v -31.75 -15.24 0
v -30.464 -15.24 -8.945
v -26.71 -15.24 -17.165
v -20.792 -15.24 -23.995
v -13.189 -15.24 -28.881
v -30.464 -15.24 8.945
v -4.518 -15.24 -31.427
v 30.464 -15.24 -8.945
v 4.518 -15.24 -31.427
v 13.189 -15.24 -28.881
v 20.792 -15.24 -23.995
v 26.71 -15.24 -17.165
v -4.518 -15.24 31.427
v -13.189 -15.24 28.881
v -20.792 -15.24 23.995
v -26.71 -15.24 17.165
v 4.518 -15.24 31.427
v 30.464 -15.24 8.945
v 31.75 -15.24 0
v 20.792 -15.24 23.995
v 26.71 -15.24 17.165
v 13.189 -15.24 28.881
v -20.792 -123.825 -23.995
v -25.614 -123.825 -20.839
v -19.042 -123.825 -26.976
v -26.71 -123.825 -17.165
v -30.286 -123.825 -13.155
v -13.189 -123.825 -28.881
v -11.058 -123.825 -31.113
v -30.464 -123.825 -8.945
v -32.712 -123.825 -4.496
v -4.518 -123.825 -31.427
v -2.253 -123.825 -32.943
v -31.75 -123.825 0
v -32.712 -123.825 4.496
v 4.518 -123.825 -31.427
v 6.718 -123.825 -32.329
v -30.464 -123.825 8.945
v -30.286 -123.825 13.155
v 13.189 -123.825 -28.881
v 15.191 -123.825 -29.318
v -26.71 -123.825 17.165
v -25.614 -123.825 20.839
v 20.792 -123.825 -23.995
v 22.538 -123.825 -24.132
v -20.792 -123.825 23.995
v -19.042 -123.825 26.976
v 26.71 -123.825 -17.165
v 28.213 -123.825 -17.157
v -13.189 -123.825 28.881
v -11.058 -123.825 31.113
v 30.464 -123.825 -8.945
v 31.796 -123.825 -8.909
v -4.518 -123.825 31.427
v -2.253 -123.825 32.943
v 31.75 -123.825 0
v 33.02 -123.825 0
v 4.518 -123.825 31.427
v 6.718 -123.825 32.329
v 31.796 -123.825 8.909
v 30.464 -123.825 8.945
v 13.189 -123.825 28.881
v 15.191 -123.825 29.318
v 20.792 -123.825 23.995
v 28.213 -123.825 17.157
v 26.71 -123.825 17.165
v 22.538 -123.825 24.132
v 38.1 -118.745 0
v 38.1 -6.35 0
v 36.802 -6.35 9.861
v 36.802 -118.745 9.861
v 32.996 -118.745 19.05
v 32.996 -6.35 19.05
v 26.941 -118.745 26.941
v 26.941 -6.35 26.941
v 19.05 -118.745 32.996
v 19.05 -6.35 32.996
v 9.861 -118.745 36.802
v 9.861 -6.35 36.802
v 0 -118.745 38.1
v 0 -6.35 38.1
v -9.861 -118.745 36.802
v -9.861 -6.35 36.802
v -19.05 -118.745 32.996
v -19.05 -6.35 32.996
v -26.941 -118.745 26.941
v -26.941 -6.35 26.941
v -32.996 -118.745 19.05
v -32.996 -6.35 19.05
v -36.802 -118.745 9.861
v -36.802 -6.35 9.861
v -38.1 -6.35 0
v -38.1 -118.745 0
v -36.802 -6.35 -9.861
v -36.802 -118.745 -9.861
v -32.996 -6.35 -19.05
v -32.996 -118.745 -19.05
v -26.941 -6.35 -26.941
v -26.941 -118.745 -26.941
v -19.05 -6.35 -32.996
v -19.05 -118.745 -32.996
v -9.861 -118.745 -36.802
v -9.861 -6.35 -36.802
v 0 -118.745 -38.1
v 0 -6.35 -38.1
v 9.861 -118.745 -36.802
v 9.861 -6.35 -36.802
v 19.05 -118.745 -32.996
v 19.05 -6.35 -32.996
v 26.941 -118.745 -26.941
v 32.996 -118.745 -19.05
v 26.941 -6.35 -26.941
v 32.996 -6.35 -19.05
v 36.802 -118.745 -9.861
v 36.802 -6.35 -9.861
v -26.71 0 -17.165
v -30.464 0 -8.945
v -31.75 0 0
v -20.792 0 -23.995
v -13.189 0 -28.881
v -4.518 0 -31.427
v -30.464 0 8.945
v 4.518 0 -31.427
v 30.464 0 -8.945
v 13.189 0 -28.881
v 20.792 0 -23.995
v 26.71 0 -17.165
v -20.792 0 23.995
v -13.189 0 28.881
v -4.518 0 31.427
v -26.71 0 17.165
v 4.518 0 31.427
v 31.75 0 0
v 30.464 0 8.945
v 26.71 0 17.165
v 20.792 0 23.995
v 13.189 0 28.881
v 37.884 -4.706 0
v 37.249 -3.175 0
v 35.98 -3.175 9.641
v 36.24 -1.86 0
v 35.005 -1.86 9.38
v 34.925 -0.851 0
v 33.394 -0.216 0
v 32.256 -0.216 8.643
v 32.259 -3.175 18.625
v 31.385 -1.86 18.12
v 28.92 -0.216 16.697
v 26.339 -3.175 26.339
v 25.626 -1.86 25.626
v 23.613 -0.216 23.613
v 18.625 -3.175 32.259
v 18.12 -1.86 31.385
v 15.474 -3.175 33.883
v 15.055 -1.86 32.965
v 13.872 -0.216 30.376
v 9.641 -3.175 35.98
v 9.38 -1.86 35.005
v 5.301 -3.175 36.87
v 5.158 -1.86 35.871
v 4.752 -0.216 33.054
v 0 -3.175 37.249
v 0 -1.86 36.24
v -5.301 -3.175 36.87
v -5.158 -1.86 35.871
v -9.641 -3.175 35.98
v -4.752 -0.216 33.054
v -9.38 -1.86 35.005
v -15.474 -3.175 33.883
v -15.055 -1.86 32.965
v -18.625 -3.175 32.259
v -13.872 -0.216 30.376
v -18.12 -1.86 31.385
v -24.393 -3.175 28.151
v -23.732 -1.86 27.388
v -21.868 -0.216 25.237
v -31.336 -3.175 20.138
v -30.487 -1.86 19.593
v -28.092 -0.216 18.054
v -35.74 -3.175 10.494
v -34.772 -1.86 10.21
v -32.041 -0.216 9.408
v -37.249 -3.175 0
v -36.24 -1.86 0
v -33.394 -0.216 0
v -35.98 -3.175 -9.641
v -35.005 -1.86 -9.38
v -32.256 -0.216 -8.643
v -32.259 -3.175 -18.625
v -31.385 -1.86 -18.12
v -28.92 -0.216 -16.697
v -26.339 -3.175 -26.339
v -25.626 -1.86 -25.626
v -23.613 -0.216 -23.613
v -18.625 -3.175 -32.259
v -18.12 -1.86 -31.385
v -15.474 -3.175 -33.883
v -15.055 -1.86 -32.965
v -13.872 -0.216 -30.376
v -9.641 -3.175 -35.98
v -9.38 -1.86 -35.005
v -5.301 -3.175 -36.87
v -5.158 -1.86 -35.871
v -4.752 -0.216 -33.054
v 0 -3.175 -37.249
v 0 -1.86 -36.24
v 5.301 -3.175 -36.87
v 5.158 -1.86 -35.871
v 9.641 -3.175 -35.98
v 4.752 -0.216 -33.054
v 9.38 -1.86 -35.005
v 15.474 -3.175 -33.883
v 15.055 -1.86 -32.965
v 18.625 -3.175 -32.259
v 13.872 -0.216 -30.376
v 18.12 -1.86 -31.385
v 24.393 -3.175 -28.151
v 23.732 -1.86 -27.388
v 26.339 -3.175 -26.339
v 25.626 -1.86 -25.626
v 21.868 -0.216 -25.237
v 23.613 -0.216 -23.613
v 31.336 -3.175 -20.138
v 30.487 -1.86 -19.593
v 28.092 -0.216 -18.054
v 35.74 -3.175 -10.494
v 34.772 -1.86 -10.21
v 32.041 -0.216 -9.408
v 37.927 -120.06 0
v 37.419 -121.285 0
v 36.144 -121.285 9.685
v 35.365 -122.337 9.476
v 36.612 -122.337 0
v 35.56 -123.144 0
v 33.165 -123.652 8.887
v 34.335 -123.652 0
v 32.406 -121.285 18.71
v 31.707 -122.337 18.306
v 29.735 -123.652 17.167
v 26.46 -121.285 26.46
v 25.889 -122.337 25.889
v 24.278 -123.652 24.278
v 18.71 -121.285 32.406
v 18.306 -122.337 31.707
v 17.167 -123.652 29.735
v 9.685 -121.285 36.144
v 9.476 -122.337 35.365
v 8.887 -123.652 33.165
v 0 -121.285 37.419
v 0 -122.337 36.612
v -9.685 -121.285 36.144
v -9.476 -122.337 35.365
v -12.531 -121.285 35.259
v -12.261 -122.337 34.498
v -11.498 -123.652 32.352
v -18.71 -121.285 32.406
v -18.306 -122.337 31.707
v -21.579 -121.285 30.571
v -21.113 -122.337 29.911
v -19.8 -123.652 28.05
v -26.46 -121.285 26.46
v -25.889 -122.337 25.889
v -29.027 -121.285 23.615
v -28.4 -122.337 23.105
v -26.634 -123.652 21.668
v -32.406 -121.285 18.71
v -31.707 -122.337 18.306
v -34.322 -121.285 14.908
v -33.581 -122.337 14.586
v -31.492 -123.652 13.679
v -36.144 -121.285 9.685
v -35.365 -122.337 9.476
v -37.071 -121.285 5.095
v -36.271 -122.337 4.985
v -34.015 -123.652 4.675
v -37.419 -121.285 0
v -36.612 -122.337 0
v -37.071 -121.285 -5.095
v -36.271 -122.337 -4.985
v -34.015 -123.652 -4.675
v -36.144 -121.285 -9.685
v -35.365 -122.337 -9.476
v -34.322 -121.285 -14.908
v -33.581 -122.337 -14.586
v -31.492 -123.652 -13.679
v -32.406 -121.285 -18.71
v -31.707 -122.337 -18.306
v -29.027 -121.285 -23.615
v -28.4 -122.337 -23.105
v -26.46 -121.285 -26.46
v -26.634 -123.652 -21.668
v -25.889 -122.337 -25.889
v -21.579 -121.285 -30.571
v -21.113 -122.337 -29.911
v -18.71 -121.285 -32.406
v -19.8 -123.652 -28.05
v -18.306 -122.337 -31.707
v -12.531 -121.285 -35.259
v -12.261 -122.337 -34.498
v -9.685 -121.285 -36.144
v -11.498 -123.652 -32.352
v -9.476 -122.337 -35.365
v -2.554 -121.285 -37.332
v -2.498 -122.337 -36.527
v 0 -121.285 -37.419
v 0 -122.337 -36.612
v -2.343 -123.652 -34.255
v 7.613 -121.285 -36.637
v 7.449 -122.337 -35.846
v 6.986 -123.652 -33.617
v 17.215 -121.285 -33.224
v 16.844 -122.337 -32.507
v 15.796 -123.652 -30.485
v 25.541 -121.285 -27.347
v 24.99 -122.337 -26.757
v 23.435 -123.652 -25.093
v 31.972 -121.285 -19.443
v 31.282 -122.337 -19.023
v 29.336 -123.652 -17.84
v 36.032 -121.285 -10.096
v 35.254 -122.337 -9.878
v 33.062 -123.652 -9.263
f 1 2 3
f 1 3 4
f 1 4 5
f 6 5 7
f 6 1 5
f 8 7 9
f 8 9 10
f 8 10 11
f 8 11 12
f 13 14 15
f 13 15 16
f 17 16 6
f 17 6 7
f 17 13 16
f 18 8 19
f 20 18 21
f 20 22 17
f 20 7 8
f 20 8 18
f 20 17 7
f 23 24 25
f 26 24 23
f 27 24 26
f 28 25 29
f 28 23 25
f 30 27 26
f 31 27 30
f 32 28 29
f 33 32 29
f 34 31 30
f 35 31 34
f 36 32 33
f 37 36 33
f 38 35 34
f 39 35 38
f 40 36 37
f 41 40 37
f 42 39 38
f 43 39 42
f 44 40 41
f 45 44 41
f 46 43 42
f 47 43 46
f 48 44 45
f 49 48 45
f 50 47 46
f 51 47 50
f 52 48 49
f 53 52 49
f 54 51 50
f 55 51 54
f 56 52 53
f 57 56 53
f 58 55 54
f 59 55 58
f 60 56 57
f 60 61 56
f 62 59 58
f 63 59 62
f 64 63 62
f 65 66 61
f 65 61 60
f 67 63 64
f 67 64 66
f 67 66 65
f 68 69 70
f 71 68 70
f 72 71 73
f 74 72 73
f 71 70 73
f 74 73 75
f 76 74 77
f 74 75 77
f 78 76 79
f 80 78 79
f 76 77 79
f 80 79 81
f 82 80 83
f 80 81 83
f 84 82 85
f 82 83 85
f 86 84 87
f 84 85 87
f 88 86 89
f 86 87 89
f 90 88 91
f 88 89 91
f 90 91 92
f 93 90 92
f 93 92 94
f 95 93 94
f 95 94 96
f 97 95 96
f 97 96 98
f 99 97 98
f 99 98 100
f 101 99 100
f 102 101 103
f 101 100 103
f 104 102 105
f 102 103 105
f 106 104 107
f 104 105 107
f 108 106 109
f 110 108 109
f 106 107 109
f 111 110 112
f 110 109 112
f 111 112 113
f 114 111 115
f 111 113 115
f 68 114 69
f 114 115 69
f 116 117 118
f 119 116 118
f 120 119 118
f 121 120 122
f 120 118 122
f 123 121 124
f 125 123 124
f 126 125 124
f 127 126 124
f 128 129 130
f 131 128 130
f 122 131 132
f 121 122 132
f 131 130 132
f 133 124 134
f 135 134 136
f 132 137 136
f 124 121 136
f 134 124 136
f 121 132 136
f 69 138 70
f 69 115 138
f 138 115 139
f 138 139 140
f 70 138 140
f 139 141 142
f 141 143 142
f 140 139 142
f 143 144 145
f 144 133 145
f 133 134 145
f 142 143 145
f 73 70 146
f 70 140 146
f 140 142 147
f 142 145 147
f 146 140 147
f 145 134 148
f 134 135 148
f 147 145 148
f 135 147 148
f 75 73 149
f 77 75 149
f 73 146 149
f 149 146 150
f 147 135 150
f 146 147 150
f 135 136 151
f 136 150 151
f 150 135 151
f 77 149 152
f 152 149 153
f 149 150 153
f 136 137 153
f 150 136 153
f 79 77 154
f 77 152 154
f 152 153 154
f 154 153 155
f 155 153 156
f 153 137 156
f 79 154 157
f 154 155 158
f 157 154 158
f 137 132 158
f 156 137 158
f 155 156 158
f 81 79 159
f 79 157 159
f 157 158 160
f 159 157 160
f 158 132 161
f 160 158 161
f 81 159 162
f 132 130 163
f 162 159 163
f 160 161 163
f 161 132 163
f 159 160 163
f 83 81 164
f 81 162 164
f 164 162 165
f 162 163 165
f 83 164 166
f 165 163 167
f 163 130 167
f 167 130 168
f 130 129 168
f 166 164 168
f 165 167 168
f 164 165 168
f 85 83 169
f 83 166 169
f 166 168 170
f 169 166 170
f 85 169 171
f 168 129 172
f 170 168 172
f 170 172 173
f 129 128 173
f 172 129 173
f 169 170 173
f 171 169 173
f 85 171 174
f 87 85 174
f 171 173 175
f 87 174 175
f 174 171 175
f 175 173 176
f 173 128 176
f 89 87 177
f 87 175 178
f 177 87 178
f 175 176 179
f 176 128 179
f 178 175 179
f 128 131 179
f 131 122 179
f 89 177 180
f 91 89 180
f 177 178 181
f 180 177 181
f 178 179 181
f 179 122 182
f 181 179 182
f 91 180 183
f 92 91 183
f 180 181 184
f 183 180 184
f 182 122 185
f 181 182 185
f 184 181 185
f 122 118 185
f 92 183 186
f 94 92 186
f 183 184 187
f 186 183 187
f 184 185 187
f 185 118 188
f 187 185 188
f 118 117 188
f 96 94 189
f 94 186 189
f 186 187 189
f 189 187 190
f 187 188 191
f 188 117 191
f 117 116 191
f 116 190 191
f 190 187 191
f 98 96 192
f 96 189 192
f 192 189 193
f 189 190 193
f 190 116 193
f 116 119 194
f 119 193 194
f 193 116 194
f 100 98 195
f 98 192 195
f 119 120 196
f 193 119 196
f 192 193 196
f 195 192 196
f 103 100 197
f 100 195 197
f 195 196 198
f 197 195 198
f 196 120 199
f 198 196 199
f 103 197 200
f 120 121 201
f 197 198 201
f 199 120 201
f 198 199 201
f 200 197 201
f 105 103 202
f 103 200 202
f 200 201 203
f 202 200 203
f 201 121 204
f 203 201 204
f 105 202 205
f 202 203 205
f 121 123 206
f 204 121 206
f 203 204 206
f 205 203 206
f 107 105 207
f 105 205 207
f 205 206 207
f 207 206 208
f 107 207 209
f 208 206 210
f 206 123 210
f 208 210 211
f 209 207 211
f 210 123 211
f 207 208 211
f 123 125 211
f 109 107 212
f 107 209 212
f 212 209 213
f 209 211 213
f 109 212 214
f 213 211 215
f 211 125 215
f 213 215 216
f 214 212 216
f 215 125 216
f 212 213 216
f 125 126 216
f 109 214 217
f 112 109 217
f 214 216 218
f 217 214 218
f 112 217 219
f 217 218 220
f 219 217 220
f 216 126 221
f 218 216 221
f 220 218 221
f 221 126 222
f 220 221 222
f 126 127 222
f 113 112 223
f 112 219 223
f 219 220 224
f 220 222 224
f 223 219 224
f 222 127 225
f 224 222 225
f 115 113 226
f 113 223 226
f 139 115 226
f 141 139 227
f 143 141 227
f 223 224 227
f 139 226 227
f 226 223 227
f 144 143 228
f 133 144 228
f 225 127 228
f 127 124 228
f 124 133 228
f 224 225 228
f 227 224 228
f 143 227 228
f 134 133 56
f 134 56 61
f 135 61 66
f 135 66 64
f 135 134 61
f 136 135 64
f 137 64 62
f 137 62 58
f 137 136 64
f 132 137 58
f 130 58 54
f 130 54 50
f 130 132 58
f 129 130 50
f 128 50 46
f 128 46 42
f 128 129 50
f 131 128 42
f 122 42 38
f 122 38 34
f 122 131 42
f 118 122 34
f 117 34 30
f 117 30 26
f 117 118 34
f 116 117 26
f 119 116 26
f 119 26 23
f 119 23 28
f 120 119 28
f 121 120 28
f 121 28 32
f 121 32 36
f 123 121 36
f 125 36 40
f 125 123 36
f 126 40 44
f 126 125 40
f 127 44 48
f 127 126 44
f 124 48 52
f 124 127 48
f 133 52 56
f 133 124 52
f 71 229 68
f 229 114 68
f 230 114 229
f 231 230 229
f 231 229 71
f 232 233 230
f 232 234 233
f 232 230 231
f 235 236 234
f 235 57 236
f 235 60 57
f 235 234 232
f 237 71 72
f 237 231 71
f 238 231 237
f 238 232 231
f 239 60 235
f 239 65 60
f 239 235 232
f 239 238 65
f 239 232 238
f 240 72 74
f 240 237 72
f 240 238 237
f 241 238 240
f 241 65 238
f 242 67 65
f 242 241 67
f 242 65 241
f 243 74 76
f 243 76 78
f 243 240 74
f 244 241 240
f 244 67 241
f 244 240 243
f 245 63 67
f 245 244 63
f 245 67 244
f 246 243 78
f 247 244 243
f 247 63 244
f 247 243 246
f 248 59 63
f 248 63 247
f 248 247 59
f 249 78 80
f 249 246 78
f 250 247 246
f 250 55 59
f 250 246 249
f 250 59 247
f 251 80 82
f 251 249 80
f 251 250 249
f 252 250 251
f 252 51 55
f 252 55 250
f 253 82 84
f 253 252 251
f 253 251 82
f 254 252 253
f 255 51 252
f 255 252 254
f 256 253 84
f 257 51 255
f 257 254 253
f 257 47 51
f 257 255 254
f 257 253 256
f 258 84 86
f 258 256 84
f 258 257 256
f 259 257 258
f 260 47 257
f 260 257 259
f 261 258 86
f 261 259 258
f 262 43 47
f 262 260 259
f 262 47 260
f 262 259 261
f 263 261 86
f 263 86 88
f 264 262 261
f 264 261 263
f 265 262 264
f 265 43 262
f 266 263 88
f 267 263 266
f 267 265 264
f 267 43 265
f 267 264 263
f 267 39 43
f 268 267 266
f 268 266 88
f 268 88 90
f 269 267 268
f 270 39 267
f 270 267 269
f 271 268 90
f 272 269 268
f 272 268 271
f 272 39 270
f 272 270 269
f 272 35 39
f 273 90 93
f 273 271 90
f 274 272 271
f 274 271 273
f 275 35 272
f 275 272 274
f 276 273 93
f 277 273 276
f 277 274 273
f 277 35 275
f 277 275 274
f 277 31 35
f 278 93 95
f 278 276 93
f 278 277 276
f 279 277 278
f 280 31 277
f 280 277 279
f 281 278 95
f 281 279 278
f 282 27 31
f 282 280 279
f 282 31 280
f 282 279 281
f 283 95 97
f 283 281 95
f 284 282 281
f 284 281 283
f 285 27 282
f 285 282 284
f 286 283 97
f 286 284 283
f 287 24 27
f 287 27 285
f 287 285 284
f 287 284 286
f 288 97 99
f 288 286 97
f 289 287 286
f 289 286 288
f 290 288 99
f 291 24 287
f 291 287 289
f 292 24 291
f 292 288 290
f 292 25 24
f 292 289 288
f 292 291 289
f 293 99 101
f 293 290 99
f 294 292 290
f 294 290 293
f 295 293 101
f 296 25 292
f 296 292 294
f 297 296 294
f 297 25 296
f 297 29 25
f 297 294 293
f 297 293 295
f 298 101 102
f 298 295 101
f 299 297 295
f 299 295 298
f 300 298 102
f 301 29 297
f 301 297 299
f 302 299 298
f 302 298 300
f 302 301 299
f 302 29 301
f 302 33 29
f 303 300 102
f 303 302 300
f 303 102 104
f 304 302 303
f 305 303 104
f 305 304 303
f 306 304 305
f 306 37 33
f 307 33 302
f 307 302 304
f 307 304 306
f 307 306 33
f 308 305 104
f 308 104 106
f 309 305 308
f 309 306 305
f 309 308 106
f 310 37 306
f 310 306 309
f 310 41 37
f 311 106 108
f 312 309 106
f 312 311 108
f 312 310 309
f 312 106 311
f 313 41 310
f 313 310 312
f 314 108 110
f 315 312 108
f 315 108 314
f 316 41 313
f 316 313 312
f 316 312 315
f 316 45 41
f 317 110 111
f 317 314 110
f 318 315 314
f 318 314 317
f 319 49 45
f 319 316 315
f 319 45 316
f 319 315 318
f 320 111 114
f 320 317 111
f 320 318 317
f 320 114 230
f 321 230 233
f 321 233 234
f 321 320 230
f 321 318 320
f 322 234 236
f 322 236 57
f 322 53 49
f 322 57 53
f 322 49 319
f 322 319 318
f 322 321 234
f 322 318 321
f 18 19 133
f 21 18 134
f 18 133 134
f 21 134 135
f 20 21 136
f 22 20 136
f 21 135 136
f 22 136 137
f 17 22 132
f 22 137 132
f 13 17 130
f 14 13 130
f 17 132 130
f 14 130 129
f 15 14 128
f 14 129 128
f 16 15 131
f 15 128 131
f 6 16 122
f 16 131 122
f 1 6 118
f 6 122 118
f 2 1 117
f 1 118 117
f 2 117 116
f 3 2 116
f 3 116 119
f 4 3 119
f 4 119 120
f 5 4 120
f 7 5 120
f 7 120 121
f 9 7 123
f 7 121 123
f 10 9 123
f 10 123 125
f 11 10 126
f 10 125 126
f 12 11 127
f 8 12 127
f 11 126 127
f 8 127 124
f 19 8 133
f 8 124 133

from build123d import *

# Parameters (mm, degrees)
F0_R     = 38.1
F0_R_2   = 31.75
F1_DEPTH = 123.825
F2_DEPTH = 15.24
F3_R     = 6.34999
F4_R     = 5.08


# Not quite as in the source:
# - a fillet or chamfer is up to 0.001 mm smaller than in the source, because OpenCascade refuses the exact size


with BuildPart() as f1:
    # F0 (on Front) → F1 (new body)
    with BuildSketch(Plane.XZ):
        Circle(F0_R)
        Circle(F0_R_2, mode=Mode.SUBTRACT)
    extrude(amount=F1_DEPTH)

    # F3 (radius 6.35 in the source; OpenCascade refuses exactly that, so slightly less here)
    f3_edges = [f1.edges().sort_by_distance(p)[0] for p in [
        (-38.1, 0, 0),
    ]]
    fillet(f3_edges, radius=F3_R)

    # F4
    f4_edges = [f1.edges().sort_by_distance(p)[0] for p in [
        (-38.1, -123.825, 0),
    ]]
    fillet(f4_edges, radius=F4_R)


with BuildPart() as f2:
    # F0 (on Front) → F2 (new body)
    with BuildSketch(Plane.XZ):
        Circle(F0_R_2)
    extrude(amount=F2_DEPTH)


solid = Compound([f1.part, f2.part])
